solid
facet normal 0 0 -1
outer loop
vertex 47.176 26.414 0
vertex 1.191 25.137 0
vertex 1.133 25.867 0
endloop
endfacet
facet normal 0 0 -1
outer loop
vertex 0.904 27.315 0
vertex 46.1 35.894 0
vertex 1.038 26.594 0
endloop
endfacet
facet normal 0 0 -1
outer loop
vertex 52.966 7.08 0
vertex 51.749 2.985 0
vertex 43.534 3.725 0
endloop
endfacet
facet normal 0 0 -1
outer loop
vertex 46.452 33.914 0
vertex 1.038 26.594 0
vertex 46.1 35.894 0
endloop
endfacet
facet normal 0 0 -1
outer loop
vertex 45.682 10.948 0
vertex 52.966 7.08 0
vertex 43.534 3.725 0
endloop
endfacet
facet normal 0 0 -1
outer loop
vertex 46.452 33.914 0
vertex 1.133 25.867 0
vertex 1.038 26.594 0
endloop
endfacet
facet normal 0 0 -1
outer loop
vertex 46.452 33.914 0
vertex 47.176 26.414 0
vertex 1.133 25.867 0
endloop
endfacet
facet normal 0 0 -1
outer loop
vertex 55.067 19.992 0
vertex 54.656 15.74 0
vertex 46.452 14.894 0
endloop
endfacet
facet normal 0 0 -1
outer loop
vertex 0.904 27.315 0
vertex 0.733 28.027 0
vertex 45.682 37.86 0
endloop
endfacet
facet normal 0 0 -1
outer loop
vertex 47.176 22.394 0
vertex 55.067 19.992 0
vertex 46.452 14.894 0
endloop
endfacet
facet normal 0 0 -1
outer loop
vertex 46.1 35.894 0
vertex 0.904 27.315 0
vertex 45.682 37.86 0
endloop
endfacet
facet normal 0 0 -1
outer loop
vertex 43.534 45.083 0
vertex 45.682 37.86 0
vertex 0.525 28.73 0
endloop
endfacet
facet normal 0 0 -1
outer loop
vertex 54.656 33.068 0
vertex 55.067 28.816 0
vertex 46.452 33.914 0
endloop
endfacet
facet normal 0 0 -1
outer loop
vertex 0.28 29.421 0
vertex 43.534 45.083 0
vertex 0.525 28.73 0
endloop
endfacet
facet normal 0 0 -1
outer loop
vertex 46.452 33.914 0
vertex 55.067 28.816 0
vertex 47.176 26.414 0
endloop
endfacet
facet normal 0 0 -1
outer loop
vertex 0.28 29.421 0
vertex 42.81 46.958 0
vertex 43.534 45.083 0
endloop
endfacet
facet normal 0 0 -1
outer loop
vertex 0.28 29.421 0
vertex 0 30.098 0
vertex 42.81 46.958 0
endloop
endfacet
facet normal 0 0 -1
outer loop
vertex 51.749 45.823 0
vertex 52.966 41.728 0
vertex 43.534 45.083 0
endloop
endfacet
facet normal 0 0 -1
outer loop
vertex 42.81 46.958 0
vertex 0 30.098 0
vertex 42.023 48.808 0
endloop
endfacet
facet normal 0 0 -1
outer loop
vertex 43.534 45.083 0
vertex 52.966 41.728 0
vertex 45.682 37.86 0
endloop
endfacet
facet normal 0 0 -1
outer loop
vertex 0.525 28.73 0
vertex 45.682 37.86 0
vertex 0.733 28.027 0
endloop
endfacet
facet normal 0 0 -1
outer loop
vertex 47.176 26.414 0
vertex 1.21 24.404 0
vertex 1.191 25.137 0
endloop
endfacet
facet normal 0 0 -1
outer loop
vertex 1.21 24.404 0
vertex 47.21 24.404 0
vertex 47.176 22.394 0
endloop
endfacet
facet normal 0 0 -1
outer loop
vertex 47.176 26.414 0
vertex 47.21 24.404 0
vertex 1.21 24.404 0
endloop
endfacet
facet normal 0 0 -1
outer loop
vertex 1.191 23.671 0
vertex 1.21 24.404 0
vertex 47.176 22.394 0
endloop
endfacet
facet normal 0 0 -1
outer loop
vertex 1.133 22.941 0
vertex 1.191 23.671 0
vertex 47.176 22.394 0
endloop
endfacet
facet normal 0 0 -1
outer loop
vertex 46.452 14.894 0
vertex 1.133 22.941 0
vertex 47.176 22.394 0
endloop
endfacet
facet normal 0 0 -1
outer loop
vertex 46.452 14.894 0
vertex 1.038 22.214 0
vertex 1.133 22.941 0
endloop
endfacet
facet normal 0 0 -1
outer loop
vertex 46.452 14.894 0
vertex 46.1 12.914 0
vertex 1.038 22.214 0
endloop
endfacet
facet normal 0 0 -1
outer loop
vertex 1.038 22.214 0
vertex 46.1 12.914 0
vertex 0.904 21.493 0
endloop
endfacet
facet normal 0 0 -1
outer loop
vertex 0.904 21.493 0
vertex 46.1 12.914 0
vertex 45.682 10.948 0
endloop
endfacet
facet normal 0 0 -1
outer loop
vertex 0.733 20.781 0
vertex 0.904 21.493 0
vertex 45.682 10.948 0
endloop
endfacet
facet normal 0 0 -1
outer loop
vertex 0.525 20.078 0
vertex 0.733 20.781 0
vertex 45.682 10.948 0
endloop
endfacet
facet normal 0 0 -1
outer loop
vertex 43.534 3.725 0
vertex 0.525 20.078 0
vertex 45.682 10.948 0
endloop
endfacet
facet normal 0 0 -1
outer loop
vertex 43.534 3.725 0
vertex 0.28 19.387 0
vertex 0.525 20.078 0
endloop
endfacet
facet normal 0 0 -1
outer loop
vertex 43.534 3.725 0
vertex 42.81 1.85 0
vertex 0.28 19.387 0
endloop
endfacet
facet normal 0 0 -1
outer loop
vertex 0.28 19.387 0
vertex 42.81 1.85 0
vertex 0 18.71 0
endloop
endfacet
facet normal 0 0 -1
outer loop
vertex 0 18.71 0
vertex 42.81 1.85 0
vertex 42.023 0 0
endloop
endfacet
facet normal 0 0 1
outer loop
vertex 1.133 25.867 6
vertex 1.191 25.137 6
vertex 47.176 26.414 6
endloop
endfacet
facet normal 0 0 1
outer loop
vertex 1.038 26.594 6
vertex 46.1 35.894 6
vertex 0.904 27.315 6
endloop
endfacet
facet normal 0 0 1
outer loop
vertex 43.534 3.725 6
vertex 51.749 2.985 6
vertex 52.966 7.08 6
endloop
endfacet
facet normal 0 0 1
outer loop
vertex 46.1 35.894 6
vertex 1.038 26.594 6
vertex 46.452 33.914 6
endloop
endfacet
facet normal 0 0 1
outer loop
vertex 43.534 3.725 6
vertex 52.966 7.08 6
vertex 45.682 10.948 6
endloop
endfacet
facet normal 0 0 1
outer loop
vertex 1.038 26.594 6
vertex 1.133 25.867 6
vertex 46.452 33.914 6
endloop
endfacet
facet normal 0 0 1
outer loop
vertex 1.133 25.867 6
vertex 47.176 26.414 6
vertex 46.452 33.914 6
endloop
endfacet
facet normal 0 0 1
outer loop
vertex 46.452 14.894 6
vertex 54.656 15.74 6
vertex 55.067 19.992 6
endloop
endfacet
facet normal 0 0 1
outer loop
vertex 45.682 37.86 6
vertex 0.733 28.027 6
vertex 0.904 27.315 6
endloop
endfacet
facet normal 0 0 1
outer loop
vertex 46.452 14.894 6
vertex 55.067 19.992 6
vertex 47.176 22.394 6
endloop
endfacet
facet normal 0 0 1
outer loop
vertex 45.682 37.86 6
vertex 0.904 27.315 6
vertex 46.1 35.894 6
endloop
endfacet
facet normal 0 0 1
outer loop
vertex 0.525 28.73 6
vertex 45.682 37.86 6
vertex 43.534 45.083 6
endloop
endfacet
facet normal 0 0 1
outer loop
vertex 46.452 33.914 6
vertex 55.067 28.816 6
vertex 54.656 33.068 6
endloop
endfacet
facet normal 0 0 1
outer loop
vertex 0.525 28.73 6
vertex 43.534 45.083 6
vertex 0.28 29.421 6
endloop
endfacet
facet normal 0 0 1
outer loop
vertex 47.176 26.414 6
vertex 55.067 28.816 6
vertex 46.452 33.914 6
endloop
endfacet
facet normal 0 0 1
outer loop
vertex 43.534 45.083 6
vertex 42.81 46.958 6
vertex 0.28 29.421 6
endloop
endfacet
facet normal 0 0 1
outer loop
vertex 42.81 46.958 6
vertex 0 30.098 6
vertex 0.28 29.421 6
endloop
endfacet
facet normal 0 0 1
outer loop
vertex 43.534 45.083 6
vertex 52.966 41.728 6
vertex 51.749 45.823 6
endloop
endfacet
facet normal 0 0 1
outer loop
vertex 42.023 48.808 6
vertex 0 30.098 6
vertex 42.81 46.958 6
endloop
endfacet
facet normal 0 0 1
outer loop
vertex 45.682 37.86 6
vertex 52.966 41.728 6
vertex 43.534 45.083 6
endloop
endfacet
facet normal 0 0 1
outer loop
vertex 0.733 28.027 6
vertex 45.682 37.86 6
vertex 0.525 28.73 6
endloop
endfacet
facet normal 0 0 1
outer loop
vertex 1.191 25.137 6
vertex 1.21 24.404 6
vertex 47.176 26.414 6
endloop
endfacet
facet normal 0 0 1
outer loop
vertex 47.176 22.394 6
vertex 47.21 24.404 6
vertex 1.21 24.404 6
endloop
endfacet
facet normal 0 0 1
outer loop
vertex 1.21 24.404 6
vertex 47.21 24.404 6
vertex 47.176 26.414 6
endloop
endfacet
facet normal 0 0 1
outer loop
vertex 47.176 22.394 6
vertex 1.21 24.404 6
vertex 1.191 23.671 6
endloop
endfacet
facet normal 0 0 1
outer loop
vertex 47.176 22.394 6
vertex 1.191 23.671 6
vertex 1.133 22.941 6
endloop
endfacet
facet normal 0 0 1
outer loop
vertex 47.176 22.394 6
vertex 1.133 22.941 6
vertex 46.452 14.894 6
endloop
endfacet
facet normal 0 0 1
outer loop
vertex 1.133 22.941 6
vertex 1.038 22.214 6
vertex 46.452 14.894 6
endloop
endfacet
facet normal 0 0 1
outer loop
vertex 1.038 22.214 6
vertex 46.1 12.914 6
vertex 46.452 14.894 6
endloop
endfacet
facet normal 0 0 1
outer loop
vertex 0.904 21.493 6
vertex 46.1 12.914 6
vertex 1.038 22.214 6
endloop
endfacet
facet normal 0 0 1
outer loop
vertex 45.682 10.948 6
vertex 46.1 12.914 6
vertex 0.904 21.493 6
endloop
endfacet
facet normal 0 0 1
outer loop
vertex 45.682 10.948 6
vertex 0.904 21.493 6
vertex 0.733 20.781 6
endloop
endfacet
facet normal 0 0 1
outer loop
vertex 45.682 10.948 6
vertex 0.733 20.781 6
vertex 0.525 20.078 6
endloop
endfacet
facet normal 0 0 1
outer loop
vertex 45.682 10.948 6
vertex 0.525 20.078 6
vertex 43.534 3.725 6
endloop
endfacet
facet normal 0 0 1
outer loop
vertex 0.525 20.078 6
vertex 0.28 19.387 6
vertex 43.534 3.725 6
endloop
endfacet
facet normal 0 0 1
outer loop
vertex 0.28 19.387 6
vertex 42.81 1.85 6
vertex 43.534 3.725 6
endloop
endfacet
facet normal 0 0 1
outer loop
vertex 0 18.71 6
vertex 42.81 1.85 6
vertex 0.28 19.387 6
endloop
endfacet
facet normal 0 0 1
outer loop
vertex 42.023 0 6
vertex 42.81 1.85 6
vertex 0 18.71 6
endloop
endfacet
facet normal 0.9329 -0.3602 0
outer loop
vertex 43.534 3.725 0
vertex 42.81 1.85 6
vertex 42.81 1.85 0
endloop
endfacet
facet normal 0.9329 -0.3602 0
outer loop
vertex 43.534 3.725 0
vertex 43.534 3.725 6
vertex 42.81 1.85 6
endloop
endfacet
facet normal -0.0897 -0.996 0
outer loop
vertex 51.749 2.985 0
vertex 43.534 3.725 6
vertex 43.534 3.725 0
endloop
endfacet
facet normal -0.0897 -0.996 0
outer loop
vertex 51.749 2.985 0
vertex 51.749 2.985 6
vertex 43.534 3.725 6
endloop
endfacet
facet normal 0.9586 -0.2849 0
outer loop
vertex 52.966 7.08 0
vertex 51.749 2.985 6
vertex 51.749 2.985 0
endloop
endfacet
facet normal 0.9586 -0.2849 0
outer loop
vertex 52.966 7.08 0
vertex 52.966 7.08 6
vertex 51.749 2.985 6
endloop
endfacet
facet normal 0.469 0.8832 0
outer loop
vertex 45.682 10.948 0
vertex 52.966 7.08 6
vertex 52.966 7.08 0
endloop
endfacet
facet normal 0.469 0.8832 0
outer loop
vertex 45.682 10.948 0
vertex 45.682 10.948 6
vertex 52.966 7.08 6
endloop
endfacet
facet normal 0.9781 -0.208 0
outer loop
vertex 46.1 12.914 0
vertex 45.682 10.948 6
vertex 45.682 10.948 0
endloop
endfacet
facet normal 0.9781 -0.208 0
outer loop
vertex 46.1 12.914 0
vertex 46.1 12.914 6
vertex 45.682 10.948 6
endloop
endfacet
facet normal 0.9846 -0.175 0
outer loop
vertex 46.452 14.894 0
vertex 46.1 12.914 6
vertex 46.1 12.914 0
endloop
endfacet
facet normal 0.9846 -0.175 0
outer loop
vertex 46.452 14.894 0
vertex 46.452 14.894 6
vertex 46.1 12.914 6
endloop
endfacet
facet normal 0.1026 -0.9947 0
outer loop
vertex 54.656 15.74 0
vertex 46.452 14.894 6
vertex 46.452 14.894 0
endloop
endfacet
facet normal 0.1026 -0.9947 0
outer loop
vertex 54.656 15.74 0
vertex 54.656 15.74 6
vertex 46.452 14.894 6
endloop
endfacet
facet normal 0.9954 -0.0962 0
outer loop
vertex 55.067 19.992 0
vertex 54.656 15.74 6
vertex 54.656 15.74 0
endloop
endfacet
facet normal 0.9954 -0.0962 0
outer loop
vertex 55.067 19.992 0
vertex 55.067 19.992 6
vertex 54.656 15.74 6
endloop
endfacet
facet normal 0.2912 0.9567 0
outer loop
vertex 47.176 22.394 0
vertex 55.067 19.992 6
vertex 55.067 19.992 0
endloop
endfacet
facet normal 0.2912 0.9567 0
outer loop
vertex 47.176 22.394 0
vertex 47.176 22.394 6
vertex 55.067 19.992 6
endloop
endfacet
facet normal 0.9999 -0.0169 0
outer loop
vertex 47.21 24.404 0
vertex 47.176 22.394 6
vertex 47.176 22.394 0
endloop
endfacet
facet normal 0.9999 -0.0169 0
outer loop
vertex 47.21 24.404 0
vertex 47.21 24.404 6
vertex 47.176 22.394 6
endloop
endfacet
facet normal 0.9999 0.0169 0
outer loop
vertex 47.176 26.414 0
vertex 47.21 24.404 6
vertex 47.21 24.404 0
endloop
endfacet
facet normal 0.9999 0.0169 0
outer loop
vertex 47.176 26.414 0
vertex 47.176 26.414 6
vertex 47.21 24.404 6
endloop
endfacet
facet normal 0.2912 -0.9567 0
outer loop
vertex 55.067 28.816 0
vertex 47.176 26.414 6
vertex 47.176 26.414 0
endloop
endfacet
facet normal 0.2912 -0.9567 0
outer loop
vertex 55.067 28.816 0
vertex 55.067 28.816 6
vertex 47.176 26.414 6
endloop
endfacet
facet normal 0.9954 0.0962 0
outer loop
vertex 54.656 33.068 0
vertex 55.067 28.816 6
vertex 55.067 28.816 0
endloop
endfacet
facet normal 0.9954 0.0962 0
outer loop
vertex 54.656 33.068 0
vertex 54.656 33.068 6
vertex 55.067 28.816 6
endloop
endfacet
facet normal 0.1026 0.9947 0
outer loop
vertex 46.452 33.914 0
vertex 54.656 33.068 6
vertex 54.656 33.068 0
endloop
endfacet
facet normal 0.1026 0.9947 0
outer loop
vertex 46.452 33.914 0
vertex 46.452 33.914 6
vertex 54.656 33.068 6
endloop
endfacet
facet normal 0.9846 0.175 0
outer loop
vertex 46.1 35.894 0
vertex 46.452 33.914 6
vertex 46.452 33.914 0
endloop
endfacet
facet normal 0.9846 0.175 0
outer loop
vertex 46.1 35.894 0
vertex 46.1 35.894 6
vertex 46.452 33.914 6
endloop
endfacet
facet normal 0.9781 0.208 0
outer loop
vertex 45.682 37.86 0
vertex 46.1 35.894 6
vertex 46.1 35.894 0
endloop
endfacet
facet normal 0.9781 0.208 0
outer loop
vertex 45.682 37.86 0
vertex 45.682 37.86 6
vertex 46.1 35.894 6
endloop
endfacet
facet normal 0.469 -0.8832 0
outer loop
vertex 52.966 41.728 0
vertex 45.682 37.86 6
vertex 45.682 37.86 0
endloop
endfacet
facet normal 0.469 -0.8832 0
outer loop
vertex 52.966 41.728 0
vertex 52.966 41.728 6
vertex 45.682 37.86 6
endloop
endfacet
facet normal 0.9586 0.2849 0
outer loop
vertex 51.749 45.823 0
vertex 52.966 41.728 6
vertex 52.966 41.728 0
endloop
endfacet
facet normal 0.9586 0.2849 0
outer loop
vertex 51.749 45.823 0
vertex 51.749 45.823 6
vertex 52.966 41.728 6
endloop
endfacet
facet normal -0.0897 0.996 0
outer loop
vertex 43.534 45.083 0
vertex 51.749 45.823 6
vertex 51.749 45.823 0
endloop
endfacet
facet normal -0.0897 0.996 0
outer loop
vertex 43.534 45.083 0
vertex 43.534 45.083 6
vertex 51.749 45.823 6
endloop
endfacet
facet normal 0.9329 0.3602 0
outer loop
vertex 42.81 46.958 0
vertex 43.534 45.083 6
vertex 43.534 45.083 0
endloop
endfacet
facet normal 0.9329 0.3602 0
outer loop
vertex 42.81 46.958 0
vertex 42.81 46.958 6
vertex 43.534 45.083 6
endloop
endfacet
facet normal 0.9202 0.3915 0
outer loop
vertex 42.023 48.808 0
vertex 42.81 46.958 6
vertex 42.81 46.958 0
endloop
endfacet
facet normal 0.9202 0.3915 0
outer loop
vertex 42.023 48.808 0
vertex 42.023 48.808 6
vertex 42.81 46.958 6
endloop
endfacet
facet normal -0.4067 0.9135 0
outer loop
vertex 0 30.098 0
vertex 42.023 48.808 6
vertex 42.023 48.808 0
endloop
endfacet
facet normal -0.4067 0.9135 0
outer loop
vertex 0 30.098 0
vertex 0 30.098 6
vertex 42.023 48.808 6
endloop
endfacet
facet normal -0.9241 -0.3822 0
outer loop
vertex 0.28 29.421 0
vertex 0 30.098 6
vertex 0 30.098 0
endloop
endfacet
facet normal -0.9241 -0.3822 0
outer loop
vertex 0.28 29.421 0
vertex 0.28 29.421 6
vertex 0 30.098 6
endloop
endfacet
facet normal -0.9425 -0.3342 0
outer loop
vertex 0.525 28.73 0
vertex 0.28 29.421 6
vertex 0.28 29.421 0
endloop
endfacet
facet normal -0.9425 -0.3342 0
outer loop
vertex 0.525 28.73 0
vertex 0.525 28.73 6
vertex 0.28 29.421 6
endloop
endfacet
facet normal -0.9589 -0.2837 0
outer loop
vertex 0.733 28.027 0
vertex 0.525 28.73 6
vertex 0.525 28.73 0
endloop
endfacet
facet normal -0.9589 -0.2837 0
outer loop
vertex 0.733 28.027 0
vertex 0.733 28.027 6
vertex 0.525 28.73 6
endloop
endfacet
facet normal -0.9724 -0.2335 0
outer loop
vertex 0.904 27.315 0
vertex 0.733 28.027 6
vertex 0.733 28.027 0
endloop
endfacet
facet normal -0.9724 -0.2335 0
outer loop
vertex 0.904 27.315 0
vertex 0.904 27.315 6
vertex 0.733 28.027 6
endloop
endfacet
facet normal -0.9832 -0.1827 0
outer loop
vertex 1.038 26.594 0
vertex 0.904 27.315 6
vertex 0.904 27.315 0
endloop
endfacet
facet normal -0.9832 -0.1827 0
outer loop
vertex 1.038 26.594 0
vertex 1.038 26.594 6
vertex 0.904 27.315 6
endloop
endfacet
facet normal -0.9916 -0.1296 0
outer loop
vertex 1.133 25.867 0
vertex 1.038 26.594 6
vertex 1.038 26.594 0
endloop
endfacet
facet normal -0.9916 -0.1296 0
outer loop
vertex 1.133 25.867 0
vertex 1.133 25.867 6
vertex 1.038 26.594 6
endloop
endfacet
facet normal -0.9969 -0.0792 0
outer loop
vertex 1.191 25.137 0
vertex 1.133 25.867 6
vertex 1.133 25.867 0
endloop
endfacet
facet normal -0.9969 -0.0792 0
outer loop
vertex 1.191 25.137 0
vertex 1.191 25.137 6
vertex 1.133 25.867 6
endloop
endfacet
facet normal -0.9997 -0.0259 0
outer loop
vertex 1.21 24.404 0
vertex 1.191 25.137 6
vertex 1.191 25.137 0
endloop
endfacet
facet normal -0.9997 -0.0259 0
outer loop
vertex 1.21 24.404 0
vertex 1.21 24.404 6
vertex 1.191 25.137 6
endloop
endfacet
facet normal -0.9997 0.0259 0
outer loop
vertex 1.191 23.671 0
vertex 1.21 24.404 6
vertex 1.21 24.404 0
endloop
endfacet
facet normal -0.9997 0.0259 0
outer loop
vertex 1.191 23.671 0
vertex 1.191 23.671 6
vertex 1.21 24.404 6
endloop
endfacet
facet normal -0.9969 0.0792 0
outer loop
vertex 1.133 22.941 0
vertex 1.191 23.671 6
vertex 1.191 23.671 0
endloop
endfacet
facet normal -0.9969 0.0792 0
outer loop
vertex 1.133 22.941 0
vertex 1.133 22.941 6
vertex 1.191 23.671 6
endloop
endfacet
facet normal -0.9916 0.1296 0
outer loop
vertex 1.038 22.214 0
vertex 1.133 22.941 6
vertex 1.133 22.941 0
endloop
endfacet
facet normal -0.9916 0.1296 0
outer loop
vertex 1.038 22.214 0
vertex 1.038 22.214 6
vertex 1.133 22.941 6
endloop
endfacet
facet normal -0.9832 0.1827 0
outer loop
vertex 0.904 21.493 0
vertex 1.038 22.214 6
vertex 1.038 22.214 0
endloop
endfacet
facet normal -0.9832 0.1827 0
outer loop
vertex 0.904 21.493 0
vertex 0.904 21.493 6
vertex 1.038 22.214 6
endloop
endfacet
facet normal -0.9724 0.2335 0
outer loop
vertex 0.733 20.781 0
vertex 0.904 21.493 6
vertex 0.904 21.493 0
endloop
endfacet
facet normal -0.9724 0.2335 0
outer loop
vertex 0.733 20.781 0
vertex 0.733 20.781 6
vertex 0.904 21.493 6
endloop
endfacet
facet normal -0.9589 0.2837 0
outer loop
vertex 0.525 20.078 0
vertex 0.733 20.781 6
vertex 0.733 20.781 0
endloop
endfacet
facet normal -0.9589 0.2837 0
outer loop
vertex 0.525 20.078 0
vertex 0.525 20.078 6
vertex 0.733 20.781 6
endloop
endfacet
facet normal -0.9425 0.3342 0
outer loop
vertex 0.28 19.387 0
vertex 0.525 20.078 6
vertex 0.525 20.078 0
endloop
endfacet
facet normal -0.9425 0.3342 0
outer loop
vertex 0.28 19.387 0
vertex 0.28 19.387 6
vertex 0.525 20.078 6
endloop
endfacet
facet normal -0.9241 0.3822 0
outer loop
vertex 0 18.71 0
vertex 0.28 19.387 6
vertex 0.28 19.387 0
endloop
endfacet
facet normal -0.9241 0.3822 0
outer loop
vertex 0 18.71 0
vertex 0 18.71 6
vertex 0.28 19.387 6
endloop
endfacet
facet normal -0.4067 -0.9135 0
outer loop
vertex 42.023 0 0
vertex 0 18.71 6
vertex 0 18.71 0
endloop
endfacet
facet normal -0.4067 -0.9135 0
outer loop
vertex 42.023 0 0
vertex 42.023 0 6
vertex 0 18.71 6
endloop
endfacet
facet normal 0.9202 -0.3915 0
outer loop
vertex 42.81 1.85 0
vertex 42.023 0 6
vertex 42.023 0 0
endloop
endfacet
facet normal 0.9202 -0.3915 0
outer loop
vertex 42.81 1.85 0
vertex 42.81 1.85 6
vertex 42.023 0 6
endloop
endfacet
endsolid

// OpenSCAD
$fn = 32;

// ----------------------------------------------------------------------
// Gear sector: 4 teeth on 48 degrees
// ----------------------------------------------------------------------

// --- parameters (mm) ---
sector_angle = 48;        // sector angle, degrees
root_r = 60;              // root circle radius
tooth_h = 8;              // tooth height over the root circle
teeth = 4;                // number of teeth on the sector
hub_r = 14;               // hub bore radius
plate_t = 6;              // sector thickness, Z
arc_step = 3;             // sampling step of the root/hub arcs, degrees

tip_r = root_r + tooth_h;  // tip circle radius

profile = [[42.023, 0], [42.81, 1.85], [43.534, 3.725], [51.749, 2.985], [52.966, 7.08], [45.682, 10.948], [46.1, 12.914], [46.452, 14.894], [54.656, 15.74], [55.067, 19.992], [47.176, 22.394], [47.21, 24.404], [47.176, 26.414], [55.067, 28.816], [54.656, 33.068], [46.452, 33.914], [46.1, 35.894], [45.682, 37.86], [52.966, 41.728], [51.749, 45.823], [43.534, 45.083], [42.81, 46.958], [42.023, 48.808], [0, 30.098], [0.28, 29.421], [0.525, 28.73], [0.733, 28.027], [0.904, 27.315], [1.038, 26.594], [1.133, 25.867], [1.191, 25.137], [1.21, 24.404], [1.191, 23.671], [1.133, 22.941], [1.038, 22.214], [0.904, 21.493], [0.733, 20.781], [0.525, 20.078], [0.28, 19.387], [0, 18.71]];  // primary outline, 40 points, counter clockwise

// --- the one profile operation ---
linear_extrude(height = plate_t) polygon(points = profile);
